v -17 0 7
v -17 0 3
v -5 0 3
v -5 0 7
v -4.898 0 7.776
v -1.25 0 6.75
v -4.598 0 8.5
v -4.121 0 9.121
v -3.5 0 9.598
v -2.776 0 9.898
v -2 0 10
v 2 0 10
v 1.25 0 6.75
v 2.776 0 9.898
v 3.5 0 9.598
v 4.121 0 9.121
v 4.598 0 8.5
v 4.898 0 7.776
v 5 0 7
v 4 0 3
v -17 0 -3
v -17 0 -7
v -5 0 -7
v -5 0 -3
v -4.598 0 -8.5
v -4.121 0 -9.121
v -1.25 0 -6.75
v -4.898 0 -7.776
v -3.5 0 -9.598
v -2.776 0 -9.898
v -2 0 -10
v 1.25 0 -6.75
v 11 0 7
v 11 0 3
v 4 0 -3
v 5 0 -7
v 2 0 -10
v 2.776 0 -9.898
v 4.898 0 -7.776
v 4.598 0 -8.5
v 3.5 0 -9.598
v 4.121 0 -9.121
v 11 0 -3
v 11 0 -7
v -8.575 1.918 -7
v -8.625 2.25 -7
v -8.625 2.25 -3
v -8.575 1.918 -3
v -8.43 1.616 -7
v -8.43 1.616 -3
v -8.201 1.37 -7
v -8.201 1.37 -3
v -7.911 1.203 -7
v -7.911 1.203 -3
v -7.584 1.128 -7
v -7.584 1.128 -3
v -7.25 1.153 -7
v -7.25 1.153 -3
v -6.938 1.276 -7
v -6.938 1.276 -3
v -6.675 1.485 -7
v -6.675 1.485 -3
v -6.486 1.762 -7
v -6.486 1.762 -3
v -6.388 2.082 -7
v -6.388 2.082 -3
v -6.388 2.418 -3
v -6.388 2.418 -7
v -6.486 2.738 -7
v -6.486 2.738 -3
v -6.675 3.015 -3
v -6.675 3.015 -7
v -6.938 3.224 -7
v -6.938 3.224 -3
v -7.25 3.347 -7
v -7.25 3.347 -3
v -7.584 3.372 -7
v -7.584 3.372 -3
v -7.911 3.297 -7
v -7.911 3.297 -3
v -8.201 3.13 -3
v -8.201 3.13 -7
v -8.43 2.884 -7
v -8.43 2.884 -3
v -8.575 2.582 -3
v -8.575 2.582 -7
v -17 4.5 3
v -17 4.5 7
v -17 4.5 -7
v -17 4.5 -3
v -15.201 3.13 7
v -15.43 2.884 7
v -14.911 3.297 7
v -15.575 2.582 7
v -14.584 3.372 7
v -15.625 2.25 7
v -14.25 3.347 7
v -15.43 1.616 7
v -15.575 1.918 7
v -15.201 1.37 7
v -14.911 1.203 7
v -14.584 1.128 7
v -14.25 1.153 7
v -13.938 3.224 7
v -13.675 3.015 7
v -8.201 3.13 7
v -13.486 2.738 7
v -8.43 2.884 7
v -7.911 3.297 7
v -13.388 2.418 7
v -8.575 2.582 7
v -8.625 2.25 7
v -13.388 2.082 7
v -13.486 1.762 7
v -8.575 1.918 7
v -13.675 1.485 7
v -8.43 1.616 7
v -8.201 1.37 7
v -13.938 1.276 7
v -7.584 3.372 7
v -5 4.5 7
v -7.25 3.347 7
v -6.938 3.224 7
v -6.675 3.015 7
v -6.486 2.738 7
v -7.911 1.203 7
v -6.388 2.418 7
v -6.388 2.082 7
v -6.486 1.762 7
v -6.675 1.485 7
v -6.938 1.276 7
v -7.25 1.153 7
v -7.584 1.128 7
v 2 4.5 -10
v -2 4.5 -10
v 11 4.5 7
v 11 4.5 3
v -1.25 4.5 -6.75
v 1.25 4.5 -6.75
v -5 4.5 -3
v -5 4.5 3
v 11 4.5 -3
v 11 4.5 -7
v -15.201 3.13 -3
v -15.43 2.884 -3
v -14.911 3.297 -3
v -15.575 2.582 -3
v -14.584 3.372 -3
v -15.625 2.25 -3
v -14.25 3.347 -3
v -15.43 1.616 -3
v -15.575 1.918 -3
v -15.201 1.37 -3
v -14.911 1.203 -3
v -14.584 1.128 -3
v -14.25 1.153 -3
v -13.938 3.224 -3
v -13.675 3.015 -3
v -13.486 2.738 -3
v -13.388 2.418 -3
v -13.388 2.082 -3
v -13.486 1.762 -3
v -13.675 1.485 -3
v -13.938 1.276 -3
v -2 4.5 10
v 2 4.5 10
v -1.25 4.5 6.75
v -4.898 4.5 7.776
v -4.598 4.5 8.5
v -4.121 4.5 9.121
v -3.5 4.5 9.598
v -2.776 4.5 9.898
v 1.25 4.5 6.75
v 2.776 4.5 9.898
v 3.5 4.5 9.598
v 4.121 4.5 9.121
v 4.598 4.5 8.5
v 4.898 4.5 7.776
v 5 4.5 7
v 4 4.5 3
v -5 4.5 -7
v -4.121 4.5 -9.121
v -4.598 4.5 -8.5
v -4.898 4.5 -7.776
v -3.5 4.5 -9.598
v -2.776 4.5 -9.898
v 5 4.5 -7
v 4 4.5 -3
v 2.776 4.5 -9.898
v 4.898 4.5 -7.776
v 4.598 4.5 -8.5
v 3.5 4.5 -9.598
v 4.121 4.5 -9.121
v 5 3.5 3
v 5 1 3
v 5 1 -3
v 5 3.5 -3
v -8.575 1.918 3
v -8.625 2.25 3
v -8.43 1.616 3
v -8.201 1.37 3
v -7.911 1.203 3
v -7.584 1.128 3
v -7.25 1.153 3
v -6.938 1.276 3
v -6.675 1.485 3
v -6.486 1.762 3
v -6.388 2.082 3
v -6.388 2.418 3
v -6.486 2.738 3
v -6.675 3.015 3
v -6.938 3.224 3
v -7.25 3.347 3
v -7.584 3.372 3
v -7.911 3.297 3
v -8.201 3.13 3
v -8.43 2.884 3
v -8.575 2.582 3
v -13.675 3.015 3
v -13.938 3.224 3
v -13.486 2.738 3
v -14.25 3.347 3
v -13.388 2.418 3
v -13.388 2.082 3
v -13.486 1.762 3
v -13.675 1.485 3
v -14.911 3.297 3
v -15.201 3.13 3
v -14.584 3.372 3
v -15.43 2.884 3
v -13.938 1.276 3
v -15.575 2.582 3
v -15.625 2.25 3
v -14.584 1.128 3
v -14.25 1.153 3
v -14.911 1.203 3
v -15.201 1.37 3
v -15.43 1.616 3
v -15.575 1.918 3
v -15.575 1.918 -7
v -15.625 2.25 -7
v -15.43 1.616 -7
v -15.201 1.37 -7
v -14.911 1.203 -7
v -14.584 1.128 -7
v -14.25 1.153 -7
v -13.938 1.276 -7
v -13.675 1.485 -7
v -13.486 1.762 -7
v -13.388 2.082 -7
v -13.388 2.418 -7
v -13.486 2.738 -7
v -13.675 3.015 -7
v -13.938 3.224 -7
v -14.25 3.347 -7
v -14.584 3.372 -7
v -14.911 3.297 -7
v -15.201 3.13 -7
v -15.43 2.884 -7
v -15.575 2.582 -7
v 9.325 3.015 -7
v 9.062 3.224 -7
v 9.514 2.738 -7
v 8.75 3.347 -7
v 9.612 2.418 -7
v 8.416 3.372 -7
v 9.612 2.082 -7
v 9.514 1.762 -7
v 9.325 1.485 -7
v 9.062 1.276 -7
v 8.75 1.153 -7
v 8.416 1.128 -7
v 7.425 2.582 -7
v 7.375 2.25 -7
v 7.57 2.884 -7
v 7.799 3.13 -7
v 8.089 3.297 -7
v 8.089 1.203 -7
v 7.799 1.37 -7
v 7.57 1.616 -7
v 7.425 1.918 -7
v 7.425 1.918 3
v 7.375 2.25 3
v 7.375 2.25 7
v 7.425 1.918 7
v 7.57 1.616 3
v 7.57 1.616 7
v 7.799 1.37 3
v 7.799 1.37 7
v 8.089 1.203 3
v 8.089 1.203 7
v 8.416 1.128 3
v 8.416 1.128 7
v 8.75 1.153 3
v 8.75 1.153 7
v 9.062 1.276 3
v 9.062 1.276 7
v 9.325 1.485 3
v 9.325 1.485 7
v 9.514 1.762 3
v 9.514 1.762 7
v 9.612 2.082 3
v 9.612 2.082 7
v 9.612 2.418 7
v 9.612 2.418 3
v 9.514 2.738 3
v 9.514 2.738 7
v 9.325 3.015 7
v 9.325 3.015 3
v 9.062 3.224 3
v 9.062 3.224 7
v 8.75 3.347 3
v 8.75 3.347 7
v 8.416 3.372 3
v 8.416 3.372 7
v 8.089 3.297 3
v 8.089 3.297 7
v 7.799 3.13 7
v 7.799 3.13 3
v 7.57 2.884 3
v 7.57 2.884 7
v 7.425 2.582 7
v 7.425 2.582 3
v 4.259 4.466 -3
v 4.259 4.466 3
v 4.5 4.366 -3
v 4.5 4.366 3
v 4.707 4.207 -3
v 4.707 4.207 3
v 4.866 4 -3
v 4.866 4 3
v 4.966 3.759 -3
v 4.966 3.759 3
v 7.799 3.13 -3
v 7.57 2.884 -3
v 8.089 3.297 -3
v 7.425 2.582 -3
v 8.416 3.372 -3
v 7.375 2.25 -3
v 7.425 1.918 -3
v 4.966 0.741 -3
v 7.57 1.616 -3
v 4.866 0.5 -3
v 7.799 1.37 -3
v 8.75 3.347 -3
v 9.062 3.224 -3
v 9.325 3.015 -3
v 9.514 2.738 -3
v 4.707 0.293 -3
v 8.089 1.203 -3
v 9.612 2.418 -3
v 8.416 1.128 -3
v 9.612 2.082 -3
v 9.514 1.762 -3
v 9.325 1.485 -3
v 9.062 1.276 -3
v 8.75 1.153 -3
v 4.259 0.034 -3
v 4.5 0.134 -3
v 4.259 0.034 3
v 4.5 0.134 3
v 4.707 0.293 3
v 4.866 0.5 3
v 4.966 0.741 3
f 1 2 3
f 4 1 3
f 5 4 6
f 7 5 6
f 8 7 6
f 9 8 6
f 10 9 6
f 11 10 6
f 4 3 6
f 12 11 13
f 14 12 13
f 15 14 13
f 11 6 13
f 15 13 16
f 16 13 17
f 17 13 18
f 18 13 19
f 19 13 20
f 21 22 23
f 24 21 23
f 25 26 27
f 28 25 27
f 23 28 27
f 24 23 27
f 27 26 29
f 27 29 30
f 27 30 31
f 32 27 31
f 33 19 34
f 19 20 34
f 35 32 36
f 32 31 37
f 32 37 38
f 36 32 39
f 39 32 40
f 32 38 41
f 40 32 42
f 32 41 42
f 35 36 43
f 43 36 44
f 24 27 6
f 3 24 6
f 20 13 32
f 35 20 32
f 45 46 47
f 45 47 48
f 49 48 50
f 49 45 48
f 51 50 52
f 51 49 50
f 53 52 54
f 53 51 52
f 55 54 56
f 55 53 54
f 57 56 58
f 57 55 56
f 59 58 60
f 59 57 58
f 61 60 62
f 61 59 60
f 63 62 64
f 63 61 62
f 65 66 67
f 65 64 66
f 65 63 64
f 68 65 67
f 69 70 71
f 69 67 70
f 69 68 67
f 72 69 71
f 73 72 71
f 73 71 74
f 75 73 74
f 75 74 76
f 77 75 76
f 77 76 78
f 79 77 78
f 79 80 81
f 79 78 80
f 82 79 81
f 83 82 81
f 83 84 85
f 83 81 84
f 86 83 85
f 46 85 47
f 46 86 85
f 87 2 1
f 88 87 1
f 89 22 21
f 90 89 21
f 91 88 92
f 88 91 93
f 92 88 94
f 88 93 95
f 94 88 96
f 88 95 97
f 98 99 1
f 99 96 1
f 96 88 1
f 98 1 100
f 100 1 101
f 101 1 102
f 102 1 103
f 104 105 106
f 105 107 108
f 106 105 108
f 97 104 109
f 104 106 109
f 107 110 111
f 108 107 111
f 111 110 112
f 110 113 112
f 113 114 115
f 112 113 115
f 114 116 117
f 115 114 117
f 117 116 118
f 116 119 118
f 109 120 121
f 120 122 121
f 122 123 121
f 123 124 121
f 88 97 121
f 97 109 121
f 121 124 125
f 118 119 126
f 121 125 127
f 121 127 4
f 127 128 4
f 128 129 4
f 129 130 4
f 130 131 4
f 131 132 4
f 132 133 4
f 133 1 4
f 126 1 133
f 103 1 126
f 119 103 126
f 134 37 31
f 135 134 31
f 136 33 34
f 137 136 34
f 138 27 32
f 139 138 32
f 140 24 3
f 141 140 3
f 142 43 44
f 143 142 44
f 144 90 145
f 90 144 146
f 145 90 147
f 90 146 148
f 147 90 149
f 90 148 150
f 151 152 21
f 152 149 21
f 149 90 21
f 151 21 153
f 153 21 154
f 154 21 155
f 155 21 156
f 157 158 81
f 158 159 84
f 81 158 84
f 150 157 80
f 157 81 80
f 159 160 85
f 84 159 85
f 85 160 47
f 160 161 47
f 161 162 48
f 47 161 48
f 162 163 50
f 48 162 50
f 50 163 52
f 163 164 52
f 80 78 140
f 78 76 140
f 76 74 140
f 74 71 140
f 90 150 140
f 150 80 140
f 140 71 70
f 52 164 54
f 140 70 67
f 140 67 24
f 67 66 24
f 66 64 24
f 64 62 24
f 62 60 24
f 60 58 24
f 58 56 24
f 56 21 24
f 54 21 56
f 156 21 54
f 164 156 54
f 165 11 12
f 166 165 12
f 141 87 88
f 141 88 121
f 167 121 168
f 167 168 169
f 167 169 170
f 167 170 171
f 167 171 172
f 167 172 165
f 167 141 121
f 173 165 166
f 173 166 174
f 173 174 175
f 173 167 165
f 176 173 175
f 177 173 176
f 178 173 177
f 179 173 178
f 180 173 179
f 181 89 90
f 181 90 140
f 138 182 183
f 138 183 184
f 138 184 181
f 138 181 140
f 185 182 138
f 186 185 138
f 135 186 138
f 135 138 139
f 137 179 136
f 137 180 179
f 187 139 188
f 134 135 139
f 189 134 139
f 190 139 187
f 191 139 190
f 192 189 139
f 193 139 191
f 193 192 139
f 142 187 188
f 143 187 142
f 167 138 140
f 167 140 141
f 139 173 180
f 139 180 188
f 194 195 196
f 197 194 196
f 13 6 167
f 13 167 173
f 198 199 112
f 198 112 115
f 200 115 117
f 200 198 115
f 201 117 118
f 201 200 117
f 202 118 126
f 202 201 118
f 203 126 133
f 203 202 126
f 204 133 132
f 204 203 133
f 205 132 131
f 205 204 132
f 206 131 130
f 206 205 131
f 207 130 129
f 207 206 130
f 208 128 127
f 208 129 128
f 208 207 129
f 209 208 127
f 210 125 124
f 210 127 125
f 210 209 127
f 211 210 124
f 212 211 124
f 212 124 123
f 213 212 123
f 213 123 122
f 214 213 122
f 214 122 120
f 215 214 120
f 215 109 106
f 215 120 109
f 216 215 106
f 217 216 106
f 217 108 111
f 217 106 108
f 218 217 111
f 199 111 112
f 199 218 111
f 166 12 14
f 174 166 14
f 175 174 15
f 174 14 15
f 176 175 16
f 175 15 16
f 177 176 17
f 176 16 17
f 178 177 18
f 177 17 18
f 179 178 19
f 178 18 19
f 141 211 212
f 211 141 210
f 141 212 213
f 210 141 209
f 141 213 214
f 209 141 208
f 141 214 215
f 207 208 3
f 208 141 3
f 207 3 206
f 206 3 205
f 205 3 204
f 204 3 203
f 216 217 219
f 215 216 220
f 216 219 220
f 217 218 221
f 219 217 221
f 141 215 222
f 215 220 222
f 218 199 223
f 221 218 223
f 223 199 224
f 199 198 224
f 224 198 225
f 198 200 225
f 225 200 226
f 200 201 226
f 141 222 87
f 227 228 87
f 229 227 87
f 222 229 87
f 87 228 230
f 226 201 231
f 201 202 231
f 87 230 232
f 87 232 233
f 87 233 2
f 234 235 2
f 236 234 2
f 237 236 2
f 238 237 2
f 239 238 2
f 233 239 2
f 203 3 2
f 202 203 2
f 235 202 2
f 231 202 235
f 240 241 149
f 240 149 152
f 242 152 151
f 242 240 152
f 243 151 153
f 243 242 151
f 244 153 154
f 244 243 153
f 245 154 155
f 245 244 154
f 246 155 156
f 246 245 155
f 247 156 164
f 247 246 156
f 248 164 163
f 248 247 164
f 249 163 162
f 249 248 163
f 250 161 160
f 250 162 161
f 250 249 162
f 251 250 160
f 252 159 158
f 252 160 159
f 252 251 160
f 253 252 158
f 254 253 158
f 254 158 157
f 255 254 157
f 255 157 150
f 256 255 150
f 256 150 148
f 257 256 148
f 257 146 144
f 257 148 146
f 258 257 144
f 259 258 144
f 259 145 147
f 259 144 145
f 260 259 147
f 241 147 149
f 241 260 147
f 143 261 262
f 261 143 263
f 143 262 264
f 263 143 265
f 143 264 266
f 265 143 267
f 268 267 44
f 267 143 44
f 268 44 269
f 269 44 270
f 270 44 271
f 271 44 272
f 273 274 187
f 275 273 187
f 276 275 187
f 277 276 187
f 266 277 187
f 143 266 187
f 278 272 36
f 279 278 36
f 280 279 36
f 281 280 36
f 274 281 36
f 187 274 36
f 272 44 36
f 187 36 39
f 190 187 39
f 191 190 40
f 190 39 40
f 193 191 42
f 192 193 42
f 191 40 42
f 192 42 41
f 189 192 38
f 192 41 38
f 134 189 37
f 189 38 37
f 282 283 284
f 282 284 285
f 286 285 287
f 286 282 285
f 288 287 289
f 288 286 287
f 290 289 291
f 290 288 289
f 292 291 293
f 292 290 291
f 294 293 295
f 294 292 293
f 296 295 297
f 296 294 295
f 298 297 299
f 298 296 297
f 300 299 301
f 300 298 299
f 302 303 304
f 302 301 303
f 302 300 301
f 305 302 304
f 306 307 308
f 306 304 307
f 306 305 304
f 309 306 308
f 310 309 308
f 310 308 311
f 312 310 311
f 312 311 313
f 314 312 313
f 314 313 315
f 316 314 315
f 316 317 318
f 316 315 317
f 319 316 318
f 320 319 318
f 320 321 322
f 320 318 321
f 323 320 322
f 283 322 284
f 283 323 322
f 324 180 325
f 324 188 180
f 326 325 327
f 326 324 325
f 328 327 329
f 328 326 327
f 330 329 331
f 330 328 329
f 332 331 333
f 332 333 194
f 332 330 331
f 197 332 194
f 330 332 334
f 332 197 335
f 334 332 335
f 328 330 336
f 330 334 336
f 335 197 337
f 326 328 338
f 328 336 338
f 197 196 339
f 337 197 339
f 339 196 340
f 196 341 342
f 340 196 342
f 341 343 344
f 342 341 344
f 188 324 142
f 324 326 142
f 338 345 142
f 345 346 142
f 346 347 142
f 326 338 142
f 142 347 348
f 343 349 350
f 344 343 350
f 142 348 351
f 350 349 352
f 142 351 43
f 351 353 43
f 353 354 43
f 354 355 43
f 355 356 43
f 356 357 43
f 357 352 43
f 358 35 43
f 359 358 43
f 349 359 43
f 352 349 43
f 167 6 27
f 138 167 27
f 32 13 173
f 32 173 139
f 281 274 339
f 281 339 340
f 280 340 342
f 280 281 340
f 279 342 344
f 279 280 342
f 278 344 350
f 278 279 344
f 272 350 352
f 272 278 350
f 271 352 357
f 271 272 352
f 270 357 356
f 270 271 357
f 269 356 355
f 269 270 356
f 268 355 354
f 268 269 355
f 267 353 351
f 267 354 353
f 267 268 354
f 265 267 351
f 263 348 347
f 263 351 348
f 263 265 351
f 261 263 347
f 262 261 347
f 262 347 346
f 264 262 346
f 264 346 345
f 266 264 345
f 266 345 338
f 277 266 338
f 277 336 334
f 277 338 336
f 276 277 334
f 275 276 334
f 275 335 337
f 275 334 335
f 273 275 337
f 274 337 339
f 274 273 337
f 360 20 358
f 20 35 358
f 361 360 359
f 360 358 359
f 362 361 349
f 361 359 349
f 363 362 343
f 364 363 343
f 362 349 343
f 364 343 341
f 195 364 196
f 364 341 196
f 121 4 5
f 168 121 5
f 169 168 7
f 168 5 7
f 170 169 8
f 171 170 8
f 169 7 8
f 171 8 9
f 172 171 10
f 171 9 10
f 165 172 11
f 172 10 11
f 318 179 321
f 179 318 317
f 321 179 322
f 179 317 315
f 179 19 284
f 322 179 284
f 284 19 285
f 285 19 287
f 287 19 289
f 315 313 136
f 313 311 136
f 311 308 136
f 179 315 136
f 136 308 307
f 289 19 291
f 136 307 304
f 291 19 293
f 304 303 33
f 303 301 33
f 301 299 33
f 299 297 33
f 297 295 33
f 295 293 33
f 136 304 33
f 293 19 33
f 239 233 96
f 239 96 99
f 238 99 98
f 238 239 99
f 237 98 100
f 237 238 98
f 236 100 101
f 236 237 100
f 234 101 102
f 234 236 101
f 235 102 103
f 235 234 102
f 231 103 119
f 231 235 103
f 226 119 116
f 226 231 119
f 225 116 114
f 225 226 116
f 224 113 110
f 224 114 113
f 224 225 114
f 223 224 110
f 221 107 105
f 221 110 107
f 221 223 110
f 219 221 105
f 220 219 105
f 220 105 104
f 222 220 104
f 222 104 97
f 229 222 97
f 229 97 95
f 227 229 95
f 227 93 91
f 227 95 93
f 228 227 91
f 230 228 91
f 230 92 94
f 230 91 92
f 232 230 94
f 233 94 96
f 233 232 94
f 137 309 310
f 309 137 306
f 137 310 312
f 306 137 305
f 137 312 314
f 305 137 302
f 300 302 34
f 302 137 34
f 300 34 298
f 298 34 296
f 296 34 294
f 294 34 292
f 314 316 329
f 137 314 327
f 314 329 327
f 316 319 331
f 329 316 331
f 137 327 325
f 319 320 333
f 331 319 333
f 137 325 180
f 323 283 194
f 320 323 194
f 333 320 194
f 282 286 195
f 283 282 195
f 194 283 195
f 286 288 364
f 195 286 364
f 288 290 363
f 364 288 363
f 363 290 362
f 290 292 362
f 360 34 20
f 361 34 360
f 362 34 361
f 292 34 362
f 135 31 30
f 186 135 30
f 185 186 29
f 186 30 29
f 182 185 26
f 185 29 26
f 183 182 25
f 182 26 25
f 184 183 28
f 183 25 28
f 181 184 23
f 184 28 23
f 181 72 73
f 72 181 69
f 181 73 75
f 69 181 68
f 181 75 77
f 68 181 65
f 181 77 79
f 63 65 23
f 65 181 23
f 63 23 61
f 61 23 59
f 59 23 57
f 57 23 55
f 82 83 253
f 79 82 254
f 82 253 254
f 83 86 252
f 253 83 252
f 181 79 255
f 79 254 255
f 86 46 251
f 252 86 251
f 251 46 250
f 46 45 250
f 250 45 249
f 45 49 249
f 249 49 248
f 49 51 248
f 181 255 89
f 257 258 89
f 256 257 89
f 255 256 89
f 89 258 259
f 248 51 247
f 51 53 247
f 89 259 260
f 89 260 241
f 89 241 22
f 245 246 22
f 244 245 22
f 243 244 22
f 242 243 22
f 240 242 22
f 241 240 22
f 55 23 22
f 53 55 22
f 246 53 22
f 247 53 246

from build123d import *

# Parameters (mm, degrees)
CROQUIS1_W                 = 2.5
CROQUIS1_H                 = 13.5
SALIENTE_EXTRUIR1_DEPTH    = 4.5
CORTAR_EXTRUIR4_DEPTH      = 10
CORTAR_EXTRUIR4_DEPTH_BACK = 23.169799277
CROQUIS7_R                 = 1.125
REDONDEO3_R                = 1


with BuildPart() as part:
    # Croquis1 → Saliente-Extruir1 (new body)
    with BuildSketch(Plane(origin=(0, 0, 0), x_dir=(1, 0, 0), z_dir=(0, 1, 0))):
        with BuildLine():
            Line((-2, -10), (2, -10))
            ThreePointArc((2, -10), (4.121320344, -9.121320344), (5, -7))
            Line((5, -7), (11, -7))
            Line((11, -7), (11, -3))
            Line((11, -3), (5, -3))
            Line((5, -3), (5, 3))
            Line((5, 3), (11, 3))
            Line((11, 3), (11, 7))
            Line((11, 7), (5, 7))
            ThreePointArc((5, 7), (4.121320344, 9.121320344), (2, 10))
            Line((2, 10), (-2, 10))
            ThreePointArc((-2, 10), (-4.121320344, 9.121320344), (-5, 7))
            Line((-5, 7), (-17, 7))
            Line((-17, 7), (-17, 3))
            Line((-17, 3), (-5, 3))
            Line((-5, 3), (-5, -3))
            Line((-5, -3), (-17, -3))
            Line((-17, -3), (-17, -7))
            Line((-17, -7), (-5, -7))
            ThreePointArc((-5, -7), (-4.121320344, -9.121320344), (-2, -10))
        make_face()
        Rectangle(CROQUIS1_W, CROQUIS1_H, mode=Mode.SUBTRACT)
    extrude(amount=SALIENTE_EXTRUIR1_DEPTH)

    # Croquis7 → Cortar-Extruir4 (cut, two sides: drawn at the far end of the back side and taken through both)
    with BuildSketch(Plane.XY.offset(3.5).offset(-CORTAR_EXTRUIR4_DEPTH_BACK)):
        with Locations(Location((-14.5, 2.25, 0), (0, 0, 180))):
            Circle(CROQUIS7_R)
        with Locations(Location((8.5, 2.25, 0), (0, 0, 180))):
            Circle(CROQUIS7_R)
        with Locations(Location((-7.5, 2.25, 0), (0, 0, 180))):
            Circle(CROQUIS7_R)
    extrude(amount=CORTAR_EXTRUIR4_DEPTH + CORTAR_EXTRUIR4_DEPTH_BACK, mode=Mode.SUBTRACT)

    # Redondeo3
    redondeo3_edges = [part.edges().sort_by_distance(p)[0] for p in [
        (5, 0, 0),
        (5, 4.5, 0),
    ]]
    fillet(redondeo3_edges, radius=REDONDEO3_R)


solid = part.part
